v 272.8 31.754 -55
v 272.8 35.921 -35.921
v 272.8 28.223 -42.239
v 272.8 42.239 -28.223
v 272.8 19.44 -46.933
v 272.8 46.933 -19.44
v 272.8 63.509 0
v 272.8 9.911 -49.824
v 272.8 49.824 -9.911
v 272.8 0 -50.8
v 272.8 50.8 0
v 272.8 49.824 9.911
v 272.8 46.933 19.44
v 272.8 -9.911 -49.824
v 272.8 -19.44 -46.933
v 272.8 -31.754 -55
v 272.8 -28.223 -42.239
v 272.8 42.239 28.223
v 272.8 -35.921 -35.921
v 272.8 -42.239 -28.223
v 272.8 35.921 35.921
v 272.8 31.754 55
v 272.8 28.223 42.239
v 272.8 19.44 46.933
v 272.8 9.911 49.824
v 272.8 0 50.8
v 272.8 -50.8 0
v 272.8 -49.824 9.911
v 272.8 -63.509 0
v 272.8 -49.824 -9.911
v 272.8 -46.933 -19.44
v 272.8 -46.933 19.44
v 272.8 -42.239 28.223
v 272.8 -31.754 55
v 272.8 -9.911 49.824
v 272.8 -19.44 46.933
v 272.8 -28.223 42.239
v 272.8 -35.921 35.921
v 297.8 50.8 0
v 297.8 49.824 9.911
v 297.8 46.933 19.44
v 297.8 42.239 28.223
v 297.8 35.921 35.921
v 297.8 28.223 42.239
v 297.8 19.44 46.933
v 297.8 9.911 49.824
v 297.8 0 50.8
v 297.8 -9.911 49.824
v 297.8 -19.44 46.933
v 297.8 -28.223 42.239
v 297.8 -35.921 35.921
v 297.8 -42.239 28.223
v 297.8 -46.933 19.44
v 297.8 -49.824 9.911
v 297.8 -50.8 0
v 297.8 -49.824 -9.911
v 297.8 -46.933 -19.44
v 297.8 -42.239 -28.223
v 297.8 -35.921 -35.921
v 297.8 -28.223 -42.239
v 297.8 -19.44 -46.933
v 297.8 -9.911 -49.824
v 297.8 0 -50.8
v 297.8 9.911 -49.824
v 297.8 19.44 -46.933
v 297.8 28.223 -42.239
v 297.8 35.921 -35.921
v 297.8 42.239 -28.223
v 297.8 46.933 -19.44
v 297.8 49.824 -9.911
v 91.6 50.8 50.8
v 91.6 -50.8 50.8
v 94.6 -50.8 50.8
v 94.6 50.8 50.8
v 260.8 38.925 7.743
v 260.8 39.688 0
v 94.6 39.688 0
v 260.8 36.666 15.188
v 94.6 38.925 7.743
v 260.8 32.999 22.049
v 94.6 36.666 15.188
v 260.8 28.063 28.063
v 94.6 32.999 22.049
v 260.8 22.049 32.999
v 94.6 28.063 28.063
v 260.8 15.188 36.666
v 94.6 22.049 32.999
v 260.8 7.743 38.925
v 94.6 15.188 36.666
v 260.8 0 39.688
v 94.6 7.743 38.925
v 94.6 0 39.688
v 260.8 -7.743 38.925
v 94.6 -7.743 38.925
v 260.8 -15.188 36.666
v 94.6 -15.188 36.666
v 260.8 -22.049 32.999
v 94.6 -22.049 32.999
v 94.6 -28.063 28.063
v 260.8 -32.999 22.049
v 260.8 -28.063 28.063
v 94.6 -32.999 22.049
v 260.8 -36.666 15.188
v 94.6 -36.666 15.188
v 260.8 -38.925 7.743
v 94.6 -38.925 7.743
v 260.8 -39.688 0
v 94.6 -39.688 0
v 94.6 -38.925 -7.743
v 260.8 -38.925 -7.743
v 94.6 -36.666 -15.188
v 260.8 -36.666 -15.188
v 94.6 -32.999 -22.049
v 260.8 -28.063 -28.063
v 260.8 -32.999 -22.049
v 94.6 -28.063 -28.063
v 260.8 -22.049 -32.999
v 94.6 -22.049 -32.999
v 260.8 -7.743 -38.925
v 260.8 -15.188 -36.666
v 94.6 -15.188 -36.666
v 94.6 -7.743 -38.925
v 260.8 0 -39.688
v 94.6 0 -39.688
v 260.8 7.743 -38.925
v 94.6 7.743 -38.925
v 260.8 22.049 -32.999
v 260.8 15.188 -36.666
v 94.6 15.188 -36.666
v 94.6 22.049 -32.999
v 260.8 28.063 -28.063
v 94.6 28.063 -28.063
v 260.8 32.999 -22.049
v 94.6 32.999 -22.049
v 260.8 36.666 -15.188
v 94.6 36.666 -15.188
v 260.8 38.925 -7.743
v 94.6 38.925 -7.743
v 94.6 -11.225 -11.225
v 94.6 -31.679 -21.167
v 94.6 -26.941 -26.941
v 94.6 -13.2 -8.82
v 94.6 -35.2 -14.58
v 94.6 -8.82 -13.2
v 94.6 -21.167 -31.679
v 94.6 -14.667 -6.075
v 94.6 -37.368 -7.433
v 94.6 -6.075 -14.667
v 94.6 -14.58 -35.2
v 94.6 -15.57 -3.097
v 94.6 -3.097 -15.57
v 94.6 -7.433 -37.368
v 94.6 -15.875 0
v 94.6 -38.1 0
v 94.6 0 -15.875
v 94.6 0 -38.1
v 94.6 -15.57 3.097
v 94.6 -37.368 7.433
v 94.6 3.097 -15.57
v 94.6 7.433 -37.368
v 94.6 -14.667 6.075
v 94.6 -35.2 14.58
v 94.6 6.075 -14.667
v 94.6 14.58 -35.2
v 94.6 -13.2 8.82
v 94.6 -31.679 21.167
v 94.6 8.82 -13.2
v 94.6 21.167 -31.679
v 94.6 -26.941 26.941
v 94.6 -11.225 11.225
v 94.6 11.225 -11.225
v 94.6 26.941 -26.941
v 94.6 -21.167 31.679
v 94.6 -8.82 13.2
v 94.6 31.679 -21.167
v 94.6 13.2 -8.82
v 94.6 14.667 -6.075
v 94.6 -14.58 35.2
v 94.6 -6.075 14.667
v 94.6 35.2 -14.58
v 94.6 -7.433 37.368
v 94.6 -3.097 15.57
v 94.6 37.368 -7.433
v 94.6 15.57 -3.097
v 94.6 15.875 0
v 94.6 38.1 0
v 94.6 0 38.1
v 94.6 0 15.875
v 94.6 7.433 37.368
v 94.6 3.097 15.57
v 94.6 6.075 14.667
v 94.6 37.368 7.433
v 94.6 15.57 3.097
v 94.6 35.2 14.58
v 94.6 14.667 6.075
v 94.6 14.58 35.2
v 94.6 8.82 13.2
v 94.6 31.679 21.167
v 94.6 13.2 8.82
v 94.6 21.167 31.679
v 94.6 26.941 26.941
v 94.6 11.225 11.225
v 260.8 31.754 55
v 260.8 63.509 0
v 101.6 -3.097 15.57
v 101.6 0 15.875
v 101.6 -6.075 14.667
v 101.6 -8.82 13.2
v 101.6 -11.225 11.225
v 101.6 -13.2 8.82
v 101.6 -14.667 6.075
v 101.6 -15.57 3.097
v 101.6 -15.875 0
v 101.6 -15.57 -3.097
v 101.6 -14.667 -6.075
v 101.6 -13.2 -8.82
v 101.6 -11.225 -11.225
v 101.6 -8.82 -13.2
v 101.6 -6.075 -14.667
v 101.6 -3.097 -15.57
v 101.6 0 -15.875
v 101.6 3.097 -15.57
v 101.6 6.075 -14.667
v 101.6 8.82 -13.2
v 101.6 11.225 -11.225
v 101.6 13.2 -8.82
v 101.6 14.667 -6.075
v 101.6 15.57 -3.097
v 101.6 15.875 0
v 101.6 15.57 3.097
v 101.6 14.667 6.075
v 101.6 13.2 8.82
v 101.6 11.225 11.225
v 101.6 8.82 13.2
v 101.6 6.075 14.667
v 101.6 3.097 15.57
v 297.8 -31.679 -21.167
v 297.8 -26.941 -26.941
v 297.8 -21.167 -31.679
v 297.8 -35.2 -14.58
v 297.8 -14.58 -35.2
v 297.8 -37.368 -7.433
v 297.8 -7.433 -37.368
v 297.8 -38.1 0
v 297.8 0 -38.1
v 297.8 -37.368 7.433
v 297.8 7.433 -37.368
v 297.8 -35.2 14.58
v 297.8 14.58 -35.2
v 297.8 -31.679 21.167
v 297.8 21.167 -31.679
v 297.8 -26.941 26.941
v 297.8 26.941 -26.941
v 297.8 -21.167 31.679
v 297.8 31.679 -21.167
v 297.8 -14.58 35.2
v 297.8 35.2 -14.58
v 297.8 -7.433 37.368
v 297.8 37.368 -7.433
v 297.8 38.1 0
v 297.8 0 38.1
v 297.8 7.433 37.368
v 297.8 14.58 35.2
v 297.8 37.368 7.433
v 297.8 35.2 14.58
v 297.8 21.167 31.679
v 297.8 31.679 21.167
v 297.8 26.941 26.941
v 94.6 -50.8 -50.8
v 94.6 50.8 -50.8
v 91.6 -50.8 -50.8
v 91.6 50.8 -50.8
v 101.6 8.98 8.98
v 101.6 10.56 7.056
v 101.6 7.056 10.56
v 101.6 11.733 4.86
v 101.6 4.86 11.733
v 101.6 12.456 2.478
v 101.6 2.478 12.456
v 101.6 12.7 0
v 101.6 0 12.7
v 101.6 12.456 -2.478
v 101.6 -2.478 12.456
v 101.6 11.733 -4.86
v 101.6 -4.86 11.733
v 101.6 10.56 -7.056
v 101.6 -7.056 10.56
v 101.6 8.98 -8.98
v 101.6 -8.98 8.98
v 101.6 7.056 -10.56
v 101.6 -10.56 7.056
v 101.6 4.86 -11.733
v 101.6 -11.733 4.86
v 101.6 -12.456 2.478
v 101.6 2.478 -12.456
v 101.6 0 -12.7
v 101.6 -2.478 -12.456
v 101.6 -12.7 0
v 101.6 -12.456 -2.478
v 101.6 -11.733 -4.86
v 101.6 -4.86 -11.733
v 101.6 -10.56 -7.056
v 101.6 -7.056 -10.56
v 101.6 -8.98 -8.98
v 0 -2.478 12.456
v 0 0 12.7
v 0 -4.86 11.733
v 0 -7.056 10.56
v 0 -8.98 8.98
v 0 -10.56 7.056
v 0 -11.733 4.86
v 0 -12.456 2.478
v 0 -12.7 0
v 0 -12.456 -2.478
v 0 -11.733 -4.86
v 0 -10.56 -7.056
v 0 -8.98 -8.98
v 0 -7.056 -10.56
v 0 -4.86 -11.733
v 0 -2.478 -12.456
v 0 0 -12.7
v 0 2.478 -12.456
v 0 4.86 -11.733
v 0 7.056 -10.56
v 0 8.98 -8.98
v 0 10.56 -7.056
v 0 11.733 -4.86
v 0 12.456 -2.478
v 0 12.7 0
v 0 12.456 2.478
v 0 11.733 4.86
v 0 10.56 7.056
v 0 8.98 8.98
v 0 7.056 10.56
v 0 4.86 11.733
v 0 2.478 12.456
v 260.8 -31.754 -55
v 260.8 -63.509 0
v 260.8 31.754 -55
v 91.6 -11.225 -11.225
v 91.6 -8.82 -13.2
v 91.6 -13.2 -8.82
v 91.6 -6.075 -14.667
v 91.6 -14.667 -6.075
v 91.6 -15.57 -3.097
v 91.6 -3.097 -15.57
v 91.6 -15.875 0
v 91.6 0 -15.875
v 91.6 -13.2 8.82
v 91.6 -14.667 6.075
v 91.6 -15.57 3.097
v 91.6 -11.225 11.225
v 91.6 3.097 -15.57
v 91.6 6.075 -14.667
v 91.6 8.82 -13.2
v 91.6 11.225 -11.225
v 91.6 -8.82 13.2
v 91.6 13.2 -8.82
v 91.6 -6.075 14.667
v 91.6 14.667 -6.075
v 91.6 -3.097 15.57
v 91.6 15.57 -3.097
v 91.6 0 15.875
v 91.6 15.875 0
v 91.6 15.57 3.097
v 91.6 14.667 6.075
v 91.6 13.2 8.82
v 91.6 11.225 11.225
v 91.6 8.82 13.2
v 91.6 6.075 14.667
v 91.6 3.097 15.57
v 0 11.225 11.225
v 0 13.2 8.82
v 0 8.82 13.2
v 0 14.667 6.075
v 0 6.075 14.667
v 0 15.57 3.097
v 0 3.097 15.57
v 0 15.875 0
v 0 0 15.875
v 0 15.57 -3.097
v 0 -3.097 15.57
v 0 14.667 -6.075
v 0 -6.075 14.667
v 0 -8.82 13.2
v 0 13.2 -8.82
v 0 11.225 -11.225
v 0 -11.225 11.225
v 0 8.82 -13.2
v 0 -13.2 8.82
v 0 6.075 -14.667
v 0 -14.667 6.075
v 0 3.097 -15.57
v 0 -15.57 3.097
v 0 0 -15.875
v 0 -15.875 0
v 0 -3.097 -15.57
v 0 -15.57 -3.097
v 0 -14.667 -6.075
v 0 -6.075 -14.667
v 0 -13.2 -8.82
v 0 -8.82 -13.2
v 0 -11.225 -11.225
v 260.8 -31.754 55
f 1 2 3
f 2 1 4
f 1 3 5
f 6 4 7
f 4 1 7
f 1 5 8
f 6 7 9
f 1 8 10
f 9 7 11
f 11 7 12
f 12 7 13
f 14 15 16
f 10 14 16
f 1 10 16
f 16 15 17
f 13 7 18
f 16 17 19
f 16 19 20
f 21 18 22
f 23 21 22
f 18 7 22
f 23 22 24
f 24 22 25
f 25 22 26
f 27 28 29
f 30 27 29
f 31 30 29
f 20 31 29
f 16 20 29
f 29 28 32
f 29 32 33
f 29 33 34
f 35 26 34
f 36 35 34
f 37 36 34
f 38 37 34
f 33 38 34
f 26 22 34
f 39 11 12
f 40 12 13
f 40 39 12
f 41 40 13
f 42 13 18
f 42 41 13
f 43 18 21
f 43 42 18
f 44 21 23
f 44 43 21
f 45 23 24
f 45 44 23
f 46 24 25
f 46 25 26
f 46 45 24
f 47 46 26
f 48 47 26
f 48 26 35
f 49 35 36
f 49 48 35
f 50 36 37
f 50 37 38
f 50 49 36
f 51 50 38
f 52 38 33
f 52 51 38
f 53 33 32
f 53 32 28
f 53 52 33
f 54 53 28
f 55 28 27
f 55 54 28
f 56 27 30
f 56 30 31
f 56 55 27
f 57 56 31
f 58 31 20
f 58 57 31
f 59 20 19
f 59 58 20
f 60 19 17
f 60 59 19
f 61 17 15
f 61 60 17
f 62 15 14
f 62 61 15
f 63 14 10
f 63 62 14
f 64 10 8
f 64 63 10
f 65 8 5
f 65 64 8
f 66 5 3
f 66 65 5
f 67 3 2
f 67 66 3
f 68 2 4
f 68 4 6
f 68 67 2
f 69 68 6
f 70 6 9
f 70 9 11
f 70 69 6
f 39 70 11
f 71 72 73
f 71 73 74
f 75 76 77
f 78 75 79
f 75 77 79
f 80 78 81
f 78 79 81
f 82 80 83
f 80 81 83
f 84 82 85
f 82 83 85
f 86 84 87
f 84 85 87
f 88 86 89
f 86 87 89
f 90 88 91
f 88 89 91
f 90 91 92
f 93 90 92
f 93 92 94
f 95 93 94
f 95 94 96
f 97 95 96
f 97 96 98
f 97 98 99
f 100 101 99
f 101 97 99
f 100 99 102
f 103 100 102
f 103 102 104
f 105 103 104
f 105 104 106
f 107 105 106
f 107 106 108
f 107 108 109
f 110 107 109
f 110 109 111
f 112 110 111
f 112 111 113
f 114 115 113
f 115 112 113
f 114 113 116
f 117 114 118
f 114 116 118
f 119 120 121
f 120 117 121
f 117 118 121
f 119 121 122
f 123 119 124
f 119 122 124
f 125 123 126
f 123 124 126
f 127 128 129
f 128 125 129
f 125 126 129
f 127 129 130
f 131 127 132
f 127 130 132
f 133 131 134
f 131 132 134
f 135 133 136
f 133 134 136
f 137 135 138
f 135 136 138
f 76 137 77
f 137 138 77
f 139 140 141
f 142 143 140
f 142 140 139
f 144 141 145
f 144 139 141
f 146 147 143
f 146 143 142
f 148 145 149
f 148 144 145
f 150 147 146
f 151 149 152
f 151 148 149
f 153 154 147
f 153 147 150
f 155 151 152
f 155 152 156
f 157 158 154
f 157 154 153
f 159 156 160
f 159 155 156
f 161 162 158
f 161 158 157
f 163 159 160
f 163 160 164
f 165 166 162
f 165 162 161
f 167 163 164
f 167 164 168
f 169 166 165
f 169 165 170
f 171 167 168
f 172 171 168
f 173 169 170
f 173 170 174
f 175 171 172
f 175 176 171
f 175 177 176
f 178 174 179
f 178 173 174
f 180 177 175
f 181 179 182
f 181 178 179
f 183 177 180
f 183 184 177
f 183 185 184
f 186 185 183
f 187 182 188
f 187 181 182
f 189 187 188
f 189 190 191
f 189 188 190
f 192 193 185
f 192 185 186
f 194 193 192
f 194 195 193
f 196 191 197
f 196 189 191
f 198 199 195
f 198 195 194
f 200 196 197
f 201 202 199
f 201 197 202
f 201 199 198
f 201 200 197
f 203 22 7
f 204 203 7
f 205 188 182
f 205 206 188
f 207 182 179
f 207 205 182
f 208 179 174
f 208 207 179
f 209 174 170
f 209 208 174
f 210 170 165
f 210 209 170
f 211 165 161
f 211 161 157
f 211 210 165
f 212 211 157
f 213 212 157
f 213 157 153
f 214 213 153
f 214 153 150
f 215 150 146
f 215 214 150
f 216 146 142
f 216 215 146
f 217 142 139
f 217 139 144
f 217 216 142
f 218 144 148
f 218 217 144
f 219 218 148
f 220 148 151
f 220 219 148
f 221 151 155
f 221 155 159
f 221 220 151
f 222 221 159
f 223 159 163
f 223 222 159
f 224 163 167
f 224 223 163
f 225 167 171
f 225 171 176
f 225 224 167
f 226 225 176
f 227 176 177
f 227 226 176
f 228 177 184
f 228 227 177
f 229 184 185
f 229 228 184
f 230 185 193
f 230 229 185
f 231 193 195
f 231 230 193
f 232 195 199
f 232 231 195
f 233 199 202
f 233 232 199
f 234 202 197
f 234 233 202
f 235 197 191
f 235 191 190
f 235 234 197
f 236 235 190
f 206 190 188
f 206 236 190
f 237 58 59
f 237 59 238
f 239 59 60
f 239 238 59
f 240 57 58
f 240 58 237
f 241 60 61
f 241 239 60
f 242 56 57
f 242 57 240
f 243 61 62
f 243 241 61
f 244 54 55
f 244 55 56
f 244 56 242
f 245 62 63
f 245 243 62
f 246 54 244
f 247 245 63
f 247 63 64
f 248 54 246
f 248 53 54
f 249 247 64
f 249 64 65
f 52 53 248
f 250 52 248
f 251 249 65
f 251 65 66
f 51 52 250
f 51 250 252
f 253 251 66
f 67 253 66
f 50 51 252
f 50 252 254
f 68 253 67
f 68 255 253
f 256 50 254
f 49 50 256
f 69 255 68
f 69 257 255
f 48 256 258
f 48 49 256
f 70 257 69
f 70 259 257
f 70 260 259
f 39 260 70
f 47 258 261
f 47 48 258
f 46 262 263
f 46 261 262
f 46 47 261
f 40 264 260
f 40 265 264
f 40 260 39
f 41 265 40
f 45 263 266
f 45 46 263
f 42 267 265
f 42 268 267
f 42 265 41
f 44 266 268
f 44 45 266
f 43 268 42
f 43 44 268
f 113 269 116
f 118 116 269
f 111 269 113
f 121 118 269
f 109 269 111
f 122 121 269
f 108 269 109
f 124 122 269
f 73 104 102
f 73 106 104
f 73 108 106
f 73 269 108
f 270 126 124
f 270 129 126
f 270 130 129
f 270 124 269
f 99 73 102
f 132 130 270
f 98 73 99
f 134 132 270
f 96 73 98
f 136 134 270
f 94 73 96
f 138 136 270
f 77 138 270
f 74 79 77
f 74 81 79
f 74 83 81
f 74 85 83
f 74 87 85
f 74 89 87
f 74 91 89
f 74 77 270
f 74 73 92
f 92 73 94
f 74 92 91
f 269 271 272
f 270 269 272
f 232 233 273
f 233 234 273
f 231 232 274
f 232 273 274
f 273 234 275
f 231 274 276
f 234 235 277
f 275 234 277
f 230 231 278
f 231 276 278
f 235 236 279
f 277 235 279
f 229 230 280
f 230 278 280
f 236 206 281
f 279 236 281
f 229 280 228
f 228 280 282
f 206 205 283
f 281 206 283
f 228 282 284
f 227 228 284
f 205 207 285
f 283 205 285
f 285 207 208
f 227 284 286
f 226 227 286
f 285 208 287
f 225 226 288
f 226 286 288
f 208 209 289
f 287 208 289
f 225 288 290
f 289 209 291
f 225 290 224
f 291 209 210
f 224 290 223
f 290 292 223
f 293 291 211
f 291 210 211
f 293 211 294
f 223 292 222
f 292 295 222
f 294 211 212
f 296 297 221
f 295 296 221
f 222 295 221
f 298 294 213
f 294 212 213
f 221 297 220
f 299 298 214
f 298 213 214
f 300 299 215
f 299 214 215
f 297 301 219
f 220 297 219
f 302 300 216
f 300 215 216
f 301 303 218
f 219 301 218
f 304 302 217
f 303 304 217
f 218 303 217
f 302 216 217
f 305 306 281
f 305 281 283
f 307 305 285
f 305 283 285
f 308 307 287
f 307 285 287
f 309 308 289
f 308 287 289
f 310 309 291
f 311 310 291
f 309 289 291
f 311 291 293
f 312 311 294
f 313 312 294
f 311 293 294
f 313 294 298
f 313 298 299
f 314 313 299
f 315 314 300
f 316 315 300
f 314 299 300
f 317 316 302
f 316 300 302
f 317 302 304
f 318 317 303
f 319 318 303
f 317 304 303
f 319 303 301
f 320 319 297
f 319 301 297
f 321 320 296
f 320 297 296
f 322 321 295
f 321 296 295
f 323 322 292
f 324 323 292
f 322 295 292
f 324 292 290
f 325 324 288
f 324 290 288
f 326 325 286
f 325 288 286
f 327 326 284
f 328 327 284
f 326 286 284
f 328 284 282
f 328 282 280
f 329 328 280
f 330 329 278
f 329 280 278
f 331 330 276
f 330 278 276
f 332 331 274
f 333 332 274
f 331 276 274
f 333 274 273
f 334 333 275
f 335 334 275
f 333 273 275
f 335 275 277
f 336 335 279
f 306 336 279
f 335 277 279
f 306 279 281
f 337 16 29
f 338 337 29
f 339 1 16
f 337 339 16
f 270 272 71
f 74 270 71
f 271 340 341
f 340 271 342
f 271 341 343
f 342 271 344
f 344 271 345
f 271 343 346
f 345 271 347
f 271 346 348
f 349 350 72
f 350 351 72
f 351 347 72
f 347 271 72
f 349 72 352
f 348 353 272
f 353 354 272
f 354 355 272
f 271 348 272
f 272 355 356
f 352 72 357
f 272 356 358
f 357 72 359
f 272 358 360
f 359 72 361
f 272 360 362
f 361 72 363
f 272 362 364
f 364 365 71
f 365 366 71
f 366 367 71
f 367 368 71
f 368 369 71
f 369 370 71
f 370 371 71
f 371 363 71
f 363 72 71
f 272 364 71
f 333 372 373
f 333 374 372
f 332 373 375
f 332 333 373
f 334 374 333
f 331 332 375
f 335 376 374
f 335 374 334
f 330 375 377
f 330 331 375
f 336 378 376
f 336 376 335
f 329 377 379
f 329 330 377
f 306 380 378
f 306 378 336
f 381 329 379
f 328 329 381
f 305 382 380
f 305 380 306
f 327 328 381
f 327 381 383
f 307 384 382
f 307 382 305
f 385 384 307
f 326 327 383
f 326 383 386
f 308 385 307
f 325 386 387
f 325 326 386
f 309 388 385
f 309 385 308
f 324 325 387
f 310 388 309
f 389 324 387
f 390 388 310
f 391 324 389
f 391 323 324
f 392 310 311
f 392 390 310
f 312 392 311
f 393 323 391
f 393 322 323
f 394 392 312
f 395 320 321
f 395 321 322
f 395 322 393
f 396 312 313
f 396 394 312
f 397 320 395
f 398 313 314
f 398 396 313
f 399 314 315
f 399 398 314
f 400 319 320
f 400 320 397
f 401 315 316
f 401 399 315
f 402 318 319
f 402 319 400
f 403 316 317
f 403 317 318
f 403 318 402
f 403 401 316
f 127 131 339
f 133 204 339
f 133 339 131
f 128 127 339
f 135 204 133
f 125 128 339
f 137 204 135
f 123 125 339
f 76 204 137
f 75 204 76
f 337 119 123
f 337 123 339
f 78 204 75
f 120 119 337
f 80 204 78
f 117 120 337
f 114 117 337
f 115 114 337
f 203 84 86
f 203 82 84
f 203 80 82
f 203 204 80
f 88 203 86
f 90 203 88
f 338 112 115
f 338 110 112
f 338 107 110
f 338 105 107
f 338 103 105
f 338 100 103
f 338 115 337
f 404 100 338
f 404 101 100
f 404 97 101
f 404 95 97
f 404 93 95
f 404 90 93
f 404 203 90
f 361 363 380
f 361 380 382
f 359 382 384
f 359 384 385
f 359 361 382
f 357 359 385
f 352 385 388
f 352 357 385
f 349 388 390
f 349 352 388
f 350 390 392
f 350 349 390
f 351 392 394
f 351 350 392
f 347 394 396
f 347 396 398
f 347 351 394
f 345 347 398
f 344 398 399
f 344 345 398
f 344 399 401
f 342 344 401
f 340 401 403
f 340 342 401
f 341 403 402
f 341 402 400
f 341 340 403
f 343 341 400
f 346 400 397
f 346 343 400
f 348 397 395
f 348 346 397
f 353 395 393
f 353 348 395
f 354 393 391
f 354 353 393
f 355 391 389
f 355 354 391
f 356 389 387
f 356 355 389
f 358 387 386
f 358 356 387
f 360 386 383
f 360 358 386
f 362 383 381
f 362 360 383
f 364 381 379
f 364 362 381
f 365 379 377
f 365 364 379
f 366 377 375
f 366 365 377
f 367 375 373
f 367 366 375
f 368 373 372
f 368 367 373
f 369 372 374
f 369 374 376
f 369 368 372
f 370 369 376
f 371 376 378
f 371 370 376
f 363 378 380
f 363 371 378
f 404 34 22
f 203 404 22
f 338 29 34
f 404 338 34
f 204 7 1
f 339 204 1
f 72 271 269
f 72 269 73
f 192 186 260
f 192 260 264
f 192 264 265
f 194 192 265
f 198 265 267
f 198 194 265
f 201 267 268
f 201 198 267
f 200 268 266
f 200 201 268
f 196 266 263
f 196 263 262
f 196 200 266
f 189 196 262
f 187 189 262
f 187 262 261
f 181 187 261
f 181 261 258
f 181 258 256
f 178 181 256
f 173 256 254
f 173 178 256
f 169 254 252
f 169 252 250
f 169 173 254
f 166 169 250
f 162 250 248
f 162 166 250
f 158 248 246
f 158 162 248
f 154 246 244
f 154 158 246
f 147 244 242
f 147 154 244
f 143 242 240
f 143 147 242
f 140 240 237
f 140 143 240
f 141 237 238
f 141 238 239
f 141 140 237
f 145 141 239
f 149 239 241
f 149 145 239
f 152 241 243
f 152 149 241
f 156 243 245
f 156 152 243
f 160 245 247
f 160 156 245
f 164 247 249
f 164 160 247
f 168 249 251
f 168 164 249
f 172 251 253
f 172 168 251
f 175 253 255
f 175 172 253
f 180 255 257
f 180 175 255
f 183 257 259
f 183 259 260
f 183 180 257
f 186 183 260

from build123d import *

# Parameters (mm, degrees)
F0_W      = 101.6
F0_H      = 3.175
F3_W      = 101.6
F3_H      = 101.6
F3_R      = 14.2875
F4_DEPTH  = 3
F5_R      = 39.6875
F5_R_2    = 38.1
F6_DEPTH  = 203.2
F7_R      = 50.8
F7_R_2    = 39.6875
F8_DEPTH  = 25
F9_R      = 39.668
F10_DEPTH = 12


with BuildPart() as f1:
    # F0 (on Front) → F1 (revolve)
    with BuildSketch(Plane.XZ):
        with Locations((50.8, 14.2875)):
            Rectangle(F0_W, F0_H)
    revolve(axis=Axis((107.303783, 0, 0), (1, 0, 0)))

    # F3 (on offset) → F4 (join)
    with BuildSketch(Plane.YZ.offset(91.6)):
        Rectangle(F3_W, F3_H)
        Circle(F3_R, mode=Mode.SUBTRACT)
    extrude(amount=F4_DEPTH)

    # F5 (on face) → F6 (join)
    with BuildSketch(Plane.YZ.offset(94.6)):
        Circle(F5_R)
        Circle(F5_R_2, mode=Mode.SUBTRACT)
    extrude(amount=F6_DEPTH)

    # F7 (on face) → F8 (join)
    with BuildSketch(Plane.YZ.offset(297.8)):
        Circle(F7_R)
        Circle(F7_R_2, mode=Mode.SUBTRACT)
    extrude(amount=-F8_DEPTH)

    # F9 (on face) → F10 (join)
    with BuildSketch(Plane(origin=(272.8, 0, 0), x_dir=(0, -1, 0), z_dir=(-1, 0, 0))):
        Polygon((63.50853, 0), (31.754265, 55), (-31.754265, 55), (-63.50853, 0), (-31.754265, -55), (31.754265, -55), align=None)
        Circle(F9_R, mode=Mode.SUBTRACT)
    extrude(amount=F10_DEPTH)


solid = f1.part
